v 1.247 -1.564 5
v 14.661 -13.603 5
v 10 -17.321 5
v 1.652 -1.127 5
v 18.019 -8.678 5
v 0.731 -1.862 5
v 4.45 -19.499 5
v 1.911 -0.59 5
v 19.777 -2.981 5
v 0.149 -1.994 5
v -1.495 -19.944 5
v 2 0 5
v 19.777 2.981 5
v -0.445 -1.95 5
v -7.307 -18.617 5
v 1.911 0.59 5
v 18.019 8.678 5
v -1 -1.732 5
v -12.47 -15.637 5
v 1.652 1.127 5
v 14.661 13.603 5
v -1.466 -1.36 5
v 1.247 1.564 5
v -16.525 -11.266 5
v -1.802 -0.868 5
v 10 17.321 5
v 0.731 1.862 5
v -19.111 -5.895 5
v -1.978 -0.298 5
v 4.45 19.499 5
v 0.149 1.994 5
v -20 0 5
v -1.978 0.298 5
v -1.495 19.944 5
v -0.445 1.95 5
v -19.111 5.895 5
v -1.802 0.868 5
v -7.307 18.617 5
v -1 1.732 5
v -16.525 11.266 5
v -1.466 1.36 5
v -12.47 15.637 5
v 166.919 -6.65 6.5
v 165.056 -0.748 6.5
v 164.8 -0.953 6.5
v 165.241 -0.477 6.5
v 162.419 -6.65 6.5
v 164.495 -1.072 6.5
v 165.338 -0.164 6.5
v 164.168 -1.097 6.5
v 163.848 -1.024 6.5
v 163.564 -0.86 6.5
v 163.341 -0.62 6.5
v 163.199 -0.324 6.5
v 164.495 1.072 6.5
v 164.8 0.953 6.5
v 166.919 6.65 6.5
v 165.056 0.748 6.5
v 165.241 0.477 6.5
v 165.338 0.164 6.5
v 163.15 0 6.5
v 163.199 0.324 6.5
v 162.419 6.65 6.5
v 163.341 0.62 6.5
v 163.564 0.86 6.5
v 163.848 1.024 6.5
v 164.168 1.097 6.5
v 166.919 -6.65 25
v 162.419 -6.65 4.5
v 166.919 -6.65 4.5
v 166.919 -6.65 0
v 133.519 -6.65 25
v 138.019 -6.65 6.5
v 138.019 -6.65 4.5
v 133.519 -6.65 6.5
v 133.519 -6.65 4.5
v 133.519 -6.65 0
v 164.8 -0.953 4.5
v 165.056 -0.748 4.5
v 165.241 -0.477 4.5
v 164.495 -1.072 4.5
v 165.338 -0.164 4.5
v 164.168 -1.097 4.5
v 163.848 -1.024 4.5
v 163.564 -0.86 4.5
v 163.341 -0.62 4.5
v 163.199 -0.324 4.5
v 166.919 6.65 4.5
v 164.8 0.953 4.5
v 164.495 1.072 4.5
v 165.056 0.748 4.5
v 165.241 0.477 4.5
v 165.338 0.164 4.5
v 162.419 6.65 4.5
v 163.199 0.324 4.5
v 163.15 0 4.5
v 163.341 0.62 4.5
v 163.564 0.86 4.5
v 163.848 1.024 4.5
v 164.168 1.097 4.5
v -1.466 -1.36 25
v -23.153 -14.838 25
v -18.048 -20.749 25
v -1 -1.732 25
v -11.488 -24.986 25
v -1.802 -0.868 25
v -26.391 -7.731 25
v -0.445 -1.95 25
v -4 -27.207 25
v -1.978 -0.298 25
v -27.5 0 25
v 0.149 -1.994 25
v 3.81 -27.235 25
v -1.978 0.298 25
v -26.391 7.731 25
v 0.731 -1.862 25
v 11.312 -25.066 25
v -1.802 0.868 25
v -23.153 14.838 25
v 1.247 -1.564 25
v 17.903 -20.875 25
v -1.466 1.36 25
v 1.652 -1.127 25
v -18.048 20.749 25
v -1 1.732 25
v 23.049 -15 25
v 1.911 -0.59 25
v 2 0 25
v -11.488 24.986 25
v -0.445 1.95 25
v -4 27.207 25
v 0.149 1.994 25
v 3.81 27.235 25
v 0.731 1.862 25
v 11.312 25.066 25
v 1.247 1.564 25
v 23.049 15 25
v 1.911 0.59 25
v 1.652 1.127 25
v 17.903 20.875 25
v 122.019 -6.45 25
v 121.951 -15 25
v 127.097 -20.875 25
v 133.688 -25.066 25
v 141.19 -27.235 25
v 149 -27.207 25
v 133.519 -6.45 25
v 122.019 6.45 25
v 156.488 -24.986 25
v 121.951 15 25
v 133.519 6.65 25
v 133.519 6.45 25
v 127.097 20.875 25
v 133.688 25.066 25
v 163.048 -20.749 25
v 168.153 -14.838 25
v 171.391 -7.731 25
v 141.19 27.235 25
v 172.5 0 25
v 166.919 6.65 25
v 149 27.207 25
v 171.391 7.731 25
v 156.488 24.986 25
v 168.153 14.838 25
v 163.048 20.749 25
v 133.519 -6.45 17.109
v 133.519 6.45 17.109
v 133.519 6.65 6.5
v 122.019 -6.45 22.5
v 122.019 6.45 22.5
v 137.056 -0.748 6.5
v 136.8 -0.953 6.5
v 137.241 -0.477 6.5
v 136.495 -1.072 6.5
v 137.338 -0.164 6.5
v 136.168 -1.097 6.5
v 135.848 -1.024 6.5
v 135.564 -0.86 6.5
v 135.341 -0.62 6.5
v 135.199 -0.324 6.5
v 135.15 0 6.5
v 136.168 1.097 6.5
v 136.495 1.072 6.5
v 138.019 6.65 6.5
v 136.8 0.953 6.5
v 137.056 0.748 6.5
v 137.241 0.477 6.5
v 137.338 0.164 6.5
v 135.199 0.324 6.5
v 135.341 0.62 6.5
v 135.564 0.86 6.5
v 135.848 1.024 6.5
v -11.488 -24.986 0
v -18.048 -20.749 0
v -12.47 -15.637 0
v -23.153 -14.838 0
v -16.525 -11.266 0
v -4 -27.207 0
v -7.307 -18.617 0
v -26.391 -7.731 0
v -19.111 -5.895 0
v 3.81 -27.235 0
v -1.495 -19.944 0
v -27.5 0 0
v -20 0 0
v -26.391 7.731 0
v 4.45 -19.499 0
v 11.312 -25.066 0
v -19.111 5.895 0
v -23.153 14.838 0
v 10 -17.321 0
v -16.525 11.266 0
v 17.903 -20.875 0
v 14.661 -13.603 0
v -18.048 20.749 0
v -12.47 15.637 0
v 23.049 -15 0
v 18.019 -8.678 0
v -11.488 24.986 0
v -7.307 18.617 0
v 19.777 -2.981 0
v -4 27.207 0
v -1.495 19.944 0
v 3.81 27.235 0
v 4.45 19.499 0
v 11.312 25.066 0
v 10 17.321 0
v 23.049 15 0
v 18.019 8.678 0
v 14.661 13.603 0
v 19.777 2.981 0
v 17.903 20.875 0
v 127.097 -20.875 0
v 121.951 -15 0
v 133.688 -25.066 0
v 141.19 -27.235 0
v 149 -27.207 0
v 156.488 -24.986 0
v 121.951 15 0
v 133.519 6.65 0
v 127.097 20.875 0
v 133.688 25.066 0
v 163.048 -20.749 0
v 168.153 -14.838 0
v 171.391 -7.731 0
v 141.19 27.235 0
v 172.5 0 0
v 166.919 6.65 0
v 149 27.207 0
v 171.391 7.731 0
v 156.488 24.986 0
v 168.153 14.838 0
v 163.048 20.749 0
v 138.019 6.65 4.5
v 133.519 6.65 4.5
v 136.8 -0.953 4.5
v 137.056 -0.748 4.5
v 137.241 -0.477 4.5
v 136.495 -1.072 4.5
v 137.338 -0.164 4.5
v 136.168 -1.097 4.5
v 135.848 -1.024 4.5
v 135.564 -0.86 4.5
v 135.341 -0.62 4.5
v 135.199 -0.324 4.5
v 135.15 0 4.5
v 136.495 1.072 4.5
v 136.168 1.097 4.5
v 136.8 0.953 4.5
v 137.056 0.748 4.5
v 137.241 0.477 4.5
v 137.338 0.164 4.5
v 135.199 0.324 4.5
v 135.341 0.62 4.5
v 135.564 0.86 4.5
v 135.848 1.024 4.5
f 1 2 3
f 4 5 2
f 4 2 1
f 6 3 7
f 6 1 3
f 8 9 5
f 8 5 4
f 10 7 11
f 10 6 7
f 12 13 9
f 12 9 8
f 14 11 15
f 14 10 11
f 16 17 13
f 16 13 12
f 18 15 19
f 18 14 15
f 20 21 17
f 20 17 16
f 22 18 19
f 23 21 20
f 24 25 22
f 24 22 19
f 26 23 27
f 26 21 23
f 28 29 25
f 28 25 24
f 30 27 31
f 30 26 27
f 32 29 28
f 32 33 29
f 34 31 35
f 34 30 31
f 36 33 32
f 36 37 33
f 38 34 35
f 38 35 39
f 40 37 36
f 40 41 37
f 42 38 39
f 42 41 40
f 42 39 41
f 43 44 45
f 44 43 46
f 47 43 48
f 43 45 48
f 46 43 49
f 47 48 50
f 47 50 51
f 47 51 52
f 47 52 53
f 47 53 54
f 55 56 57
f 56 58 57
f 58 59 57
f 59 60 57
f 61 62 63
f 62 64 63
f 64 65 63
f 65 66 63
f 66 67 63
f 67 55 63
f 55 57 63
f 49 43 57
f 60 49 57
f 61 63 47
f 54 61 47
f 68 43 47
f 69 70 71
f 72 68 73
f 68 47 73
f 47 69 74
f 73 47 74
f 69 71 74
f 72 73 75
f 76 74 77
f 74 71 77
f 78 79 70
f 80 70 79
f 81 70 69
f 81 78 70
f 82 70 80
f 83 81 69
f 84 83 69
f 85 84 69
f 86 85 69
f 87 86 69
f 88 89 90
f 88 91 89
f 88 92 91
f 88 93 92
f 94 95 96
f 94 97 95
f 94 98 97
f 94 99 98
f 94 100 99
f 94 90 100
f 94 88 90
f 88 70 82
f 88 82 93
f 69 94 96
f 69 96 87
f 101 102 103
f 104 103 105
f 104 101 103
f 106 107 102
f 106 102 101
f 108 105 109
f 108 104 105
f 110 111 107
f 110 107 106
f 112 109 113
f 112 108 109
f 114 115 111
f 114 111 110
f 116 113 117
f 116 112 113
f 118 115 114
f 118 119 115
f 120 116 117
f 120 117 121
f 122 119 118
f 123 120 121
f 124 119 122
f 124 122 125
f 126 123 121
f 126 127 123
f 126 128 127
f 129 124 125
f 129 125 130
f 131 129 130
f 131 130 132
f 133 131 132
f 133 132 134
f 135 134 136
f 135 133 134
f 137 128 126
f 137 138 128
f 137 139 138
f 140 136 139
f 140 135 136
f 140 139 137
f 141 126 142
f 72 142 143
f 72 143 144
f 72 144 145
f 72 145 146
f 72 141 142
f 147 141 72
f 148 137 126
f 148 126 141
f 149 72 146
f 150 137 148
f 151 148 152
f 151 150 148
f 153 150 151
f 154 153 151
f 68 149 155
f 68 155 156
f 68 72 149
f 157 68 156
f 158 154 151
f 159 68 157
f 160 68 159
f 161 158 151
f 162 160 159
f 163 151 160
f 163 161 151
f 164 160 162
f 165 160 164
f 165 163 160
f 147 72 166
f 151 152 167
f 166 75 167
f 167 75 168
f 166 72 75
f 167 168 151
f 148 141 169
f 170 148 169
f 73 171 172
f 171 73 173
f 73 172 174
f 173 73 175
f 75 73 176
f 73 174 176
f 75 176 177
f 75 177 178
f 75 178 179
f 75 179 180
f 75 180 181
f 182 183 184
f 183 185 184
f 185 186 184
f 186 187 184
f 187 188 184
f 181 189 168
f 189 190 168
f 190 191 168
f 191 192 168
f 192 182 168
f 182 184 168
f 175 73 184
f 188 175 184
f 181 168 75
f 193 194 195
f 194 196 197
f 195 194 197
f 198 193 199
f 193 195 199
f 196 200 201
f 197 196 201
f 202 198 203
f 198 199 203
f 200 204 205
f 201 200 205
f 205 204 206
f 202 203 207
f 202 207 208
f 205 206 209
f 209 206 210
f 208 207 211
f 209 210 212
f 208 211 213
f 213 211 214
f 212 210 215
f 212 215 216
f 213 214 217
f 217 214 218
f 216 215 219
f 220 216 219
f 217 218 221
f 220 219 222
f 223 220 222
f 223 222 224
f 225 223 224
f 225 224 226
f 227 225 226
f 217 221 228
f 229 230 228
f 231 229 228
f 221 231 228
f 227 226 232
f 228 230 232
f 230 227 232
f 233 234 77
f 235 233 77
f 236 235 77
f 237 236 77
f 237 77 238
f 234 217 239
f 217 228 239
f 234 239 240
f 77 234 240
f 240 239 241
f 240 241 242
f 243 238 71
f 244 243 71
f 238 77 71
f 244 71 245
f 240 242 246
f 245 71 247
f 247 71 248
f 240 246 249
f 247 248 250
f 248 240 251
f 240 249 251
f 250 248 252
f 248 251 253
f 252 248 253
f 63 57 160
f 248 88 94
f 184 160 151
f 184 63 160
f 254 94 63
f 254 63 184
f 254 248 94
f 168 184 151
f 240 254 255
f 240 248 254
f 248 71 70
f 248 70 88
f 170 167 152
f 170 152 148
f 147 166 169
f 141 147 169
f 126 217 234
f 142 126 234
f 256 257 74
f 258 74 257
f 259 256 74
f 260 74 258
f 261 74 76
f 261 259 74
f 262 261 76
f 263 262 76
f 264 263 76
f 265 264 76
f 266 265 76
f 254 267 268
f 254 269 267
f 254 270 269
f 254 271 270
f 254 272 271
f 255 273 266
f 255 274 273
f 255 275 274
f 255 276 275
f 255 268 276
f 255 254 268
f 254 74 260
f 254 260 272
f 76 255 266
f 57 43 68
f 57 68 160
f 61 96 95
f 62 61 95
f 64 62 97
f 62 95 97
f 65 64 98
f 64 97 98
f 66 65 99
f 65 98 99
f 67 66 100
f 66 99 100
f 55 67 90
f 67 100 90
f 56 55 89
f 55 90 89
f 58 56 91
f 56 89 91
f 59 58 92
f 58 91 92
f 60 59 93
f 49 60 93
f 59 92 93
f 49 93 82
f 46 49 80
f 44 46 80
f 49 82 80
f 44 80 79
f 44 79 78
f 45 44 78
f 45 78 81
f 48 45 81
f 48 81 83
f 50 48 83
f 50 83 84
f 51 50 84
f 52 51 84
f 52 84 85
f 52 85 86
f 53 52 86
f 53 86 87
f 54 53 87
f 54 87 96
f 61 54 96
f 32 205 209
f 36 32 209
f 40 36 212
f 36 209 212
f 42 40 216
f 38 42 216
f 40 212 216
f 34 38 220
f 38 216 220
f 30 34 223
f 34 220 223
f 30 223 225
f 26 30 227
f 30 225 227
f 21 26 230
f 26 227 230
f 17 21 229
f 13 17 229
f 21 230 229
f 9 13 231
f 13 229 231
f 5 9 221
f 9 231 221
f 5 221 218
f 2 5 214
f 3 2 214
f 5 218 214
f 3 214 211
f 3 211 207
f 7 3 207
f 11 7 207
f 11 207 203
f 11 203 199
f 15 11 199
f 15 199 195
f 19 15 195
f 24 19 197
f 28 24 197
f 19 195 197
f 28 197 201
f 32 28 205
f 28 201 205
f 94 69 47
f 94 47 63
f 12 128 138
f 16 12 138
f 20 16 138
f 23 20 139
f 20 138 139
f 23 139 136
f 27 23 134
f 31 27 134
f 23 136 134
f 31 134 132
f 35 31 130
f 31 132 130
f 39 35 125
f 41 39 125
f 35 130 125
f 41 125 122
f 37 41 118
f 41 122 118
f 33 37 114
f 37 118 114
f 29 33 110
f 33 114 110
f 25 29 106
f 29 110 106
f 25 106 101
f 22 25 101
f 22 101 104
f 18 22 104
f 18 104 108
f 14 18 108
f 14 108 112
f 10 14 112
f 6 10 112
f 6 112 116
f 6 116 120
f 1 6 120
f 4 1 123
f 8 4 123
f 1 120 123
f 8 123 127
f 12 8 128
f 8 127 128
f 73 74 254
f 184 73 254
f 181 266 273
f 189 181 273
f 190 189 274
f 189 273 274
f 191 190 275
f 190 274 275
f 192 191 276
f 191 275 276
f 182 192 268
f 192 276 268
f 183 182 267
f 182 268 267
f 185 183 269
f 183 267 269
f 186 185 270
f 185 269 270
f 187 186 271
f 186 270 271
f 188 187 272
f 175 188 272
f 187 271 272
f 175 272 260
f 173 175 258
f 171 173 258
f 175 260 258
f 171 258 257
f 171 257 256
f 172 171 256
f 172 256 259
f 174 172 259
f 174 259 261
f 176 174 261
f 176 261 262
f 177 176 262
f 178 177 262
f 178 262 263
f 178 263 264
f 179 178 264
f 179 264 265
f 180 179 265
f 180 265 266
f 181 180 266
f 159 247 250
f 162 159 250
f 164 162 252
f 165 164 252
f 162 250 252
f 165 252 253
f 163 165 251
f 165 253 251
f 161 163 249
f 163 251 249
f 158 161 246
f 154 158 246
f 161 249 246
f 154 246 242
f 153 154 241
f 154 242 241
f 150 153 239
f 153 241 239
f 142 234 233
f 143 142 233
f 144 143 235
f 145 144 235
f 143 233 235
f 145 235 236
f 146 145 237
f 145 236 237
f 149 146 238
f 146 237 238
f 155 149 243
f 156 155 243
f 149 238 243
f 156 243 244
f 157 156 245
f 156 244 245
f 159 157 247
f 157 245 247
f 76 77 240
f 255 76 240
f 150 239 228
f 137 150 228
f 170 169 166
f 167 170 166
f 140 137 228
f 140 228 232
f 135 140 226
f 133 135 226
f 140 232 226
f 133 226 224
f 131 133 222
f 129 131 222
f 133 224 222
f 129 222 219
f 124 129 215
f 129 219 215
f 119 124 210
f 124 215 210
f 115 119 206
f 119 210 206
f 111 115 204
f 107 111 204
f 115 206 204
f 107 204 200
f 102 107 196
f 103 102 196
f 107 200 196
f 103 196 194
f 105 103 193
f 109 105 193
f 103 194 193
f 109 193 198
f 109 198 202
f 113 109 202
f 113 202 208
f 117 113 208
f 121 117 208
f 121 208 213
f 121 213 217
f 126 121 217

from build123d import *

# Parameters (mm, degrees)
BOSS_EXTRUDE1_DEPTH = 25
SKETCH16_W          = 33.4
SKETCH16_H          = 13.3
CUT_EXTRUDE10_DEPTH = 4.5
SKETCH19_R          = 20
CUT_EXTRUDE14_DEPTH = 5
SKETCH17_W          = 24.4
SKETCH17_H          = 13.3
CUT_EXTRUDE11_DEPTH = 177.45821035
CUT_EXTRUDE13_DEPTH = 6.45
SKETCH20_W          = 33.4
SKETCH20_H          = 13.3
CUT_EXTRUDE15_DEPTH = 176.655202029
SKETCH21_R          = 1.1
CUT_EXTRUDE16_DEPTH = 177.45821035
SKETCH22_R          = 2
CUT_EXTRUDE17_DEPTH = 20


with BuildPart() as part:
    # Sketch1 → Boss-Extrude1 (new body)
    with BuildSketch(Plane.XY):
        with BuildLine():
            ThreePointArc((172.5, 0), (152.823244805, 26.363741023), (121.951138857, 15))
            Line((121.951138857, 15), (145, 15))
            Line((145, 15), (145, -15))
            Line((145, -15), (121.951138857, -15))
            ThreePointArc((121.951138857, -15), (152.823244805, -26.363741023), (172.5, 0))
        make_face()
        with BuildLine():
            Line((145, 15), (121.951138857, 15))
            ThreePointArc((121.951138857, 15), (117.5, 0), (121.951138857, -15))
            Line((121.951138857, -15), (145, -15))
            Line((145, -15), (145, 15))
        make_face()
        with BuildLine():
            Line((121.951138857, 15), (23.048861143, 15))
            ThreePointArc((23.048861143, 15), (26.363741023, 7.823244805), (27.5, 0))
            ThreePointArc((27.5, 0), (26.363741023, -7.823244805), (23.048861143, -15))
            Line((23.048861143, -15), (121.951138857, -15))
            ThreePointArc((121.951138857, -15), (117.5, 0), (121.951138857, 15))
        make_face()
        with BuildLine():
            ThreePointArc((13.228756555, -15), (-20, 0), (13.228756555, 15))
            Line((13.228756555, 15), (23.048861143, 15))
            ThreePointArc((23.048861143, 15), (-27.5, 0), (23.048861143, -15))
            Line((23.048861143, -15), (13.228756555, -15))
        make_face()
        with BuildLine():
            Line((23.048861143, 15), (13.228756555, 15))
            ThreePointArc((13.228756555, 15), (18.228756555, 8.228756555), (20, 0))
            ThreePointArc((20, 0), (18.228756555, -8.228756555), (13.228756555, -15))
            Line((13.228756555, -15), (23.048861143, -15))
            ThreePointArc((23.048861143, -15), (26.363741023, -7.823244805), (27.5, 0))
            ThreePointArc((27.5, 0), (26.363741023, 7.823244805), (23.048861143, 15))
        make_face()
        with BuildLine():
            Line((0, -15), (0, 15))
            Line((0, 15), (13.228756555, 15))
            ThreePointArc((13.228756555, 15), (-20, 0), (13.228756555, -15))
            Line((13.228756555, -15), (0, -15))
        make_face()
        with BuildLine():
            Line((13.228756555, 15), (0, 15))
            Line((0, 15), (0, -15))
            Line((0, -15), (13.228756555, -15))
            ThreePointArc((13.228756555, -15), (18.228756555, -8.228756555), (20, 0))
            ThreePointArc((20, 0), (18.228756555, 8.228756555), (13.228756555, 15))
        make_face()
    extrude(amount=BOSS_EXTRUDE1_DEPTH)

    # Sketch16 → Cut-Extrude10 (cut)
    with BuildSketch(Plane(origin=(0, 0, 0), x_dir=(-1, 0, 0), z_dir=(0, 0, -1))):
        with Locations((-150.21934279, 0)):
            Rectangle(SKETCH16_W, SKETCH16_H)
    extrude(amount=-CUT_EXTRUDE10_DEPTH, mode=Mode.SUBTRACT)

    # Sketch19 → Cut-Extrude14 (cut)
    with BuildSketch(Plane(origin=(0, 0, 0), x_dir=(-1, 0, 0), z_dir=(0, 0, -1))):
        Circle(SKETCH19_R)
    extrude(amount=-CUT_EXTRUDE14_DEPTH, mode=Mode.SUBTRACT)

    # Sketch17 → Cut-Extrude11 (cut, through all)
    with BuildSketch(Plane(origin=(0, 0, 0), x_dir=(-1, 0, 0), z_dir=(0, 0, -1))):
        with Locations((-150.21934279, 0)):
            Rectangle(SKETCH17_W, SKETCH17_H)
    extrude(amount=-CUT_EXTRUDE11_DEPTH, mode=Mode.SUBTRACT)

    # Sketch18 → Cut-Extrude13 (cut, symmetric)
    with BuildSketch(Plane(origin=(0, 0, 0), x_dir=(-1, 0, 0), z_dir=(0, -1, 0))):
        Polygon((-138.01934279, -15), (-138.01934279, -25), (-122.01934279, -25), (-122.01934279, -22.5), align=None)
    extrude(amount=CUT_EXTRUDE13_DEPTH, both=True, mode=Mode.SUBTRACT)

    # Sketch20 → Cut-Extrude15 (cut, through all)
    with BuildSketch(Plane(origin=(0, 0, 6.5), x_dir=(-1, 0, 0), z_dir=(0, 0, -1))):
        with Locations((-150.21934279, 0)):
            Rectangle(SKETCH20_W, SKETCH20_H)
    extrude(amount=-CUT_EXTRUDE15_DEPTH, mode=Mode.SUBTRACT)

    # Sketch21 → Cut-Extrude16 (cut, through all)
    with BuildSketch(Plane(origin=(0, 0, 0), x_dir=(-1, 0, 0), z_dir=(0, 0, -1))):
        with Locations((-164.249999957, 0)):
            Circle(SKETCH21_R)
        with Locations((-136.249999957, 0)):
            Circle(SKETCH21_R)
    extrude(amount=-CUT_EXTRUDE16_DEPTH, mode=Mode.SUBTRACT)

    # Sketch22 → Cut-Extrude17 (cut)
    with BuildSketch(Plane.XY.offset(25)):
        Circle(SKETCH22_R)
    extrude(amount=-CUT_EXTRUDE17_DEPTH, mode=Mode.SUBTRACT)


solid = part.part
